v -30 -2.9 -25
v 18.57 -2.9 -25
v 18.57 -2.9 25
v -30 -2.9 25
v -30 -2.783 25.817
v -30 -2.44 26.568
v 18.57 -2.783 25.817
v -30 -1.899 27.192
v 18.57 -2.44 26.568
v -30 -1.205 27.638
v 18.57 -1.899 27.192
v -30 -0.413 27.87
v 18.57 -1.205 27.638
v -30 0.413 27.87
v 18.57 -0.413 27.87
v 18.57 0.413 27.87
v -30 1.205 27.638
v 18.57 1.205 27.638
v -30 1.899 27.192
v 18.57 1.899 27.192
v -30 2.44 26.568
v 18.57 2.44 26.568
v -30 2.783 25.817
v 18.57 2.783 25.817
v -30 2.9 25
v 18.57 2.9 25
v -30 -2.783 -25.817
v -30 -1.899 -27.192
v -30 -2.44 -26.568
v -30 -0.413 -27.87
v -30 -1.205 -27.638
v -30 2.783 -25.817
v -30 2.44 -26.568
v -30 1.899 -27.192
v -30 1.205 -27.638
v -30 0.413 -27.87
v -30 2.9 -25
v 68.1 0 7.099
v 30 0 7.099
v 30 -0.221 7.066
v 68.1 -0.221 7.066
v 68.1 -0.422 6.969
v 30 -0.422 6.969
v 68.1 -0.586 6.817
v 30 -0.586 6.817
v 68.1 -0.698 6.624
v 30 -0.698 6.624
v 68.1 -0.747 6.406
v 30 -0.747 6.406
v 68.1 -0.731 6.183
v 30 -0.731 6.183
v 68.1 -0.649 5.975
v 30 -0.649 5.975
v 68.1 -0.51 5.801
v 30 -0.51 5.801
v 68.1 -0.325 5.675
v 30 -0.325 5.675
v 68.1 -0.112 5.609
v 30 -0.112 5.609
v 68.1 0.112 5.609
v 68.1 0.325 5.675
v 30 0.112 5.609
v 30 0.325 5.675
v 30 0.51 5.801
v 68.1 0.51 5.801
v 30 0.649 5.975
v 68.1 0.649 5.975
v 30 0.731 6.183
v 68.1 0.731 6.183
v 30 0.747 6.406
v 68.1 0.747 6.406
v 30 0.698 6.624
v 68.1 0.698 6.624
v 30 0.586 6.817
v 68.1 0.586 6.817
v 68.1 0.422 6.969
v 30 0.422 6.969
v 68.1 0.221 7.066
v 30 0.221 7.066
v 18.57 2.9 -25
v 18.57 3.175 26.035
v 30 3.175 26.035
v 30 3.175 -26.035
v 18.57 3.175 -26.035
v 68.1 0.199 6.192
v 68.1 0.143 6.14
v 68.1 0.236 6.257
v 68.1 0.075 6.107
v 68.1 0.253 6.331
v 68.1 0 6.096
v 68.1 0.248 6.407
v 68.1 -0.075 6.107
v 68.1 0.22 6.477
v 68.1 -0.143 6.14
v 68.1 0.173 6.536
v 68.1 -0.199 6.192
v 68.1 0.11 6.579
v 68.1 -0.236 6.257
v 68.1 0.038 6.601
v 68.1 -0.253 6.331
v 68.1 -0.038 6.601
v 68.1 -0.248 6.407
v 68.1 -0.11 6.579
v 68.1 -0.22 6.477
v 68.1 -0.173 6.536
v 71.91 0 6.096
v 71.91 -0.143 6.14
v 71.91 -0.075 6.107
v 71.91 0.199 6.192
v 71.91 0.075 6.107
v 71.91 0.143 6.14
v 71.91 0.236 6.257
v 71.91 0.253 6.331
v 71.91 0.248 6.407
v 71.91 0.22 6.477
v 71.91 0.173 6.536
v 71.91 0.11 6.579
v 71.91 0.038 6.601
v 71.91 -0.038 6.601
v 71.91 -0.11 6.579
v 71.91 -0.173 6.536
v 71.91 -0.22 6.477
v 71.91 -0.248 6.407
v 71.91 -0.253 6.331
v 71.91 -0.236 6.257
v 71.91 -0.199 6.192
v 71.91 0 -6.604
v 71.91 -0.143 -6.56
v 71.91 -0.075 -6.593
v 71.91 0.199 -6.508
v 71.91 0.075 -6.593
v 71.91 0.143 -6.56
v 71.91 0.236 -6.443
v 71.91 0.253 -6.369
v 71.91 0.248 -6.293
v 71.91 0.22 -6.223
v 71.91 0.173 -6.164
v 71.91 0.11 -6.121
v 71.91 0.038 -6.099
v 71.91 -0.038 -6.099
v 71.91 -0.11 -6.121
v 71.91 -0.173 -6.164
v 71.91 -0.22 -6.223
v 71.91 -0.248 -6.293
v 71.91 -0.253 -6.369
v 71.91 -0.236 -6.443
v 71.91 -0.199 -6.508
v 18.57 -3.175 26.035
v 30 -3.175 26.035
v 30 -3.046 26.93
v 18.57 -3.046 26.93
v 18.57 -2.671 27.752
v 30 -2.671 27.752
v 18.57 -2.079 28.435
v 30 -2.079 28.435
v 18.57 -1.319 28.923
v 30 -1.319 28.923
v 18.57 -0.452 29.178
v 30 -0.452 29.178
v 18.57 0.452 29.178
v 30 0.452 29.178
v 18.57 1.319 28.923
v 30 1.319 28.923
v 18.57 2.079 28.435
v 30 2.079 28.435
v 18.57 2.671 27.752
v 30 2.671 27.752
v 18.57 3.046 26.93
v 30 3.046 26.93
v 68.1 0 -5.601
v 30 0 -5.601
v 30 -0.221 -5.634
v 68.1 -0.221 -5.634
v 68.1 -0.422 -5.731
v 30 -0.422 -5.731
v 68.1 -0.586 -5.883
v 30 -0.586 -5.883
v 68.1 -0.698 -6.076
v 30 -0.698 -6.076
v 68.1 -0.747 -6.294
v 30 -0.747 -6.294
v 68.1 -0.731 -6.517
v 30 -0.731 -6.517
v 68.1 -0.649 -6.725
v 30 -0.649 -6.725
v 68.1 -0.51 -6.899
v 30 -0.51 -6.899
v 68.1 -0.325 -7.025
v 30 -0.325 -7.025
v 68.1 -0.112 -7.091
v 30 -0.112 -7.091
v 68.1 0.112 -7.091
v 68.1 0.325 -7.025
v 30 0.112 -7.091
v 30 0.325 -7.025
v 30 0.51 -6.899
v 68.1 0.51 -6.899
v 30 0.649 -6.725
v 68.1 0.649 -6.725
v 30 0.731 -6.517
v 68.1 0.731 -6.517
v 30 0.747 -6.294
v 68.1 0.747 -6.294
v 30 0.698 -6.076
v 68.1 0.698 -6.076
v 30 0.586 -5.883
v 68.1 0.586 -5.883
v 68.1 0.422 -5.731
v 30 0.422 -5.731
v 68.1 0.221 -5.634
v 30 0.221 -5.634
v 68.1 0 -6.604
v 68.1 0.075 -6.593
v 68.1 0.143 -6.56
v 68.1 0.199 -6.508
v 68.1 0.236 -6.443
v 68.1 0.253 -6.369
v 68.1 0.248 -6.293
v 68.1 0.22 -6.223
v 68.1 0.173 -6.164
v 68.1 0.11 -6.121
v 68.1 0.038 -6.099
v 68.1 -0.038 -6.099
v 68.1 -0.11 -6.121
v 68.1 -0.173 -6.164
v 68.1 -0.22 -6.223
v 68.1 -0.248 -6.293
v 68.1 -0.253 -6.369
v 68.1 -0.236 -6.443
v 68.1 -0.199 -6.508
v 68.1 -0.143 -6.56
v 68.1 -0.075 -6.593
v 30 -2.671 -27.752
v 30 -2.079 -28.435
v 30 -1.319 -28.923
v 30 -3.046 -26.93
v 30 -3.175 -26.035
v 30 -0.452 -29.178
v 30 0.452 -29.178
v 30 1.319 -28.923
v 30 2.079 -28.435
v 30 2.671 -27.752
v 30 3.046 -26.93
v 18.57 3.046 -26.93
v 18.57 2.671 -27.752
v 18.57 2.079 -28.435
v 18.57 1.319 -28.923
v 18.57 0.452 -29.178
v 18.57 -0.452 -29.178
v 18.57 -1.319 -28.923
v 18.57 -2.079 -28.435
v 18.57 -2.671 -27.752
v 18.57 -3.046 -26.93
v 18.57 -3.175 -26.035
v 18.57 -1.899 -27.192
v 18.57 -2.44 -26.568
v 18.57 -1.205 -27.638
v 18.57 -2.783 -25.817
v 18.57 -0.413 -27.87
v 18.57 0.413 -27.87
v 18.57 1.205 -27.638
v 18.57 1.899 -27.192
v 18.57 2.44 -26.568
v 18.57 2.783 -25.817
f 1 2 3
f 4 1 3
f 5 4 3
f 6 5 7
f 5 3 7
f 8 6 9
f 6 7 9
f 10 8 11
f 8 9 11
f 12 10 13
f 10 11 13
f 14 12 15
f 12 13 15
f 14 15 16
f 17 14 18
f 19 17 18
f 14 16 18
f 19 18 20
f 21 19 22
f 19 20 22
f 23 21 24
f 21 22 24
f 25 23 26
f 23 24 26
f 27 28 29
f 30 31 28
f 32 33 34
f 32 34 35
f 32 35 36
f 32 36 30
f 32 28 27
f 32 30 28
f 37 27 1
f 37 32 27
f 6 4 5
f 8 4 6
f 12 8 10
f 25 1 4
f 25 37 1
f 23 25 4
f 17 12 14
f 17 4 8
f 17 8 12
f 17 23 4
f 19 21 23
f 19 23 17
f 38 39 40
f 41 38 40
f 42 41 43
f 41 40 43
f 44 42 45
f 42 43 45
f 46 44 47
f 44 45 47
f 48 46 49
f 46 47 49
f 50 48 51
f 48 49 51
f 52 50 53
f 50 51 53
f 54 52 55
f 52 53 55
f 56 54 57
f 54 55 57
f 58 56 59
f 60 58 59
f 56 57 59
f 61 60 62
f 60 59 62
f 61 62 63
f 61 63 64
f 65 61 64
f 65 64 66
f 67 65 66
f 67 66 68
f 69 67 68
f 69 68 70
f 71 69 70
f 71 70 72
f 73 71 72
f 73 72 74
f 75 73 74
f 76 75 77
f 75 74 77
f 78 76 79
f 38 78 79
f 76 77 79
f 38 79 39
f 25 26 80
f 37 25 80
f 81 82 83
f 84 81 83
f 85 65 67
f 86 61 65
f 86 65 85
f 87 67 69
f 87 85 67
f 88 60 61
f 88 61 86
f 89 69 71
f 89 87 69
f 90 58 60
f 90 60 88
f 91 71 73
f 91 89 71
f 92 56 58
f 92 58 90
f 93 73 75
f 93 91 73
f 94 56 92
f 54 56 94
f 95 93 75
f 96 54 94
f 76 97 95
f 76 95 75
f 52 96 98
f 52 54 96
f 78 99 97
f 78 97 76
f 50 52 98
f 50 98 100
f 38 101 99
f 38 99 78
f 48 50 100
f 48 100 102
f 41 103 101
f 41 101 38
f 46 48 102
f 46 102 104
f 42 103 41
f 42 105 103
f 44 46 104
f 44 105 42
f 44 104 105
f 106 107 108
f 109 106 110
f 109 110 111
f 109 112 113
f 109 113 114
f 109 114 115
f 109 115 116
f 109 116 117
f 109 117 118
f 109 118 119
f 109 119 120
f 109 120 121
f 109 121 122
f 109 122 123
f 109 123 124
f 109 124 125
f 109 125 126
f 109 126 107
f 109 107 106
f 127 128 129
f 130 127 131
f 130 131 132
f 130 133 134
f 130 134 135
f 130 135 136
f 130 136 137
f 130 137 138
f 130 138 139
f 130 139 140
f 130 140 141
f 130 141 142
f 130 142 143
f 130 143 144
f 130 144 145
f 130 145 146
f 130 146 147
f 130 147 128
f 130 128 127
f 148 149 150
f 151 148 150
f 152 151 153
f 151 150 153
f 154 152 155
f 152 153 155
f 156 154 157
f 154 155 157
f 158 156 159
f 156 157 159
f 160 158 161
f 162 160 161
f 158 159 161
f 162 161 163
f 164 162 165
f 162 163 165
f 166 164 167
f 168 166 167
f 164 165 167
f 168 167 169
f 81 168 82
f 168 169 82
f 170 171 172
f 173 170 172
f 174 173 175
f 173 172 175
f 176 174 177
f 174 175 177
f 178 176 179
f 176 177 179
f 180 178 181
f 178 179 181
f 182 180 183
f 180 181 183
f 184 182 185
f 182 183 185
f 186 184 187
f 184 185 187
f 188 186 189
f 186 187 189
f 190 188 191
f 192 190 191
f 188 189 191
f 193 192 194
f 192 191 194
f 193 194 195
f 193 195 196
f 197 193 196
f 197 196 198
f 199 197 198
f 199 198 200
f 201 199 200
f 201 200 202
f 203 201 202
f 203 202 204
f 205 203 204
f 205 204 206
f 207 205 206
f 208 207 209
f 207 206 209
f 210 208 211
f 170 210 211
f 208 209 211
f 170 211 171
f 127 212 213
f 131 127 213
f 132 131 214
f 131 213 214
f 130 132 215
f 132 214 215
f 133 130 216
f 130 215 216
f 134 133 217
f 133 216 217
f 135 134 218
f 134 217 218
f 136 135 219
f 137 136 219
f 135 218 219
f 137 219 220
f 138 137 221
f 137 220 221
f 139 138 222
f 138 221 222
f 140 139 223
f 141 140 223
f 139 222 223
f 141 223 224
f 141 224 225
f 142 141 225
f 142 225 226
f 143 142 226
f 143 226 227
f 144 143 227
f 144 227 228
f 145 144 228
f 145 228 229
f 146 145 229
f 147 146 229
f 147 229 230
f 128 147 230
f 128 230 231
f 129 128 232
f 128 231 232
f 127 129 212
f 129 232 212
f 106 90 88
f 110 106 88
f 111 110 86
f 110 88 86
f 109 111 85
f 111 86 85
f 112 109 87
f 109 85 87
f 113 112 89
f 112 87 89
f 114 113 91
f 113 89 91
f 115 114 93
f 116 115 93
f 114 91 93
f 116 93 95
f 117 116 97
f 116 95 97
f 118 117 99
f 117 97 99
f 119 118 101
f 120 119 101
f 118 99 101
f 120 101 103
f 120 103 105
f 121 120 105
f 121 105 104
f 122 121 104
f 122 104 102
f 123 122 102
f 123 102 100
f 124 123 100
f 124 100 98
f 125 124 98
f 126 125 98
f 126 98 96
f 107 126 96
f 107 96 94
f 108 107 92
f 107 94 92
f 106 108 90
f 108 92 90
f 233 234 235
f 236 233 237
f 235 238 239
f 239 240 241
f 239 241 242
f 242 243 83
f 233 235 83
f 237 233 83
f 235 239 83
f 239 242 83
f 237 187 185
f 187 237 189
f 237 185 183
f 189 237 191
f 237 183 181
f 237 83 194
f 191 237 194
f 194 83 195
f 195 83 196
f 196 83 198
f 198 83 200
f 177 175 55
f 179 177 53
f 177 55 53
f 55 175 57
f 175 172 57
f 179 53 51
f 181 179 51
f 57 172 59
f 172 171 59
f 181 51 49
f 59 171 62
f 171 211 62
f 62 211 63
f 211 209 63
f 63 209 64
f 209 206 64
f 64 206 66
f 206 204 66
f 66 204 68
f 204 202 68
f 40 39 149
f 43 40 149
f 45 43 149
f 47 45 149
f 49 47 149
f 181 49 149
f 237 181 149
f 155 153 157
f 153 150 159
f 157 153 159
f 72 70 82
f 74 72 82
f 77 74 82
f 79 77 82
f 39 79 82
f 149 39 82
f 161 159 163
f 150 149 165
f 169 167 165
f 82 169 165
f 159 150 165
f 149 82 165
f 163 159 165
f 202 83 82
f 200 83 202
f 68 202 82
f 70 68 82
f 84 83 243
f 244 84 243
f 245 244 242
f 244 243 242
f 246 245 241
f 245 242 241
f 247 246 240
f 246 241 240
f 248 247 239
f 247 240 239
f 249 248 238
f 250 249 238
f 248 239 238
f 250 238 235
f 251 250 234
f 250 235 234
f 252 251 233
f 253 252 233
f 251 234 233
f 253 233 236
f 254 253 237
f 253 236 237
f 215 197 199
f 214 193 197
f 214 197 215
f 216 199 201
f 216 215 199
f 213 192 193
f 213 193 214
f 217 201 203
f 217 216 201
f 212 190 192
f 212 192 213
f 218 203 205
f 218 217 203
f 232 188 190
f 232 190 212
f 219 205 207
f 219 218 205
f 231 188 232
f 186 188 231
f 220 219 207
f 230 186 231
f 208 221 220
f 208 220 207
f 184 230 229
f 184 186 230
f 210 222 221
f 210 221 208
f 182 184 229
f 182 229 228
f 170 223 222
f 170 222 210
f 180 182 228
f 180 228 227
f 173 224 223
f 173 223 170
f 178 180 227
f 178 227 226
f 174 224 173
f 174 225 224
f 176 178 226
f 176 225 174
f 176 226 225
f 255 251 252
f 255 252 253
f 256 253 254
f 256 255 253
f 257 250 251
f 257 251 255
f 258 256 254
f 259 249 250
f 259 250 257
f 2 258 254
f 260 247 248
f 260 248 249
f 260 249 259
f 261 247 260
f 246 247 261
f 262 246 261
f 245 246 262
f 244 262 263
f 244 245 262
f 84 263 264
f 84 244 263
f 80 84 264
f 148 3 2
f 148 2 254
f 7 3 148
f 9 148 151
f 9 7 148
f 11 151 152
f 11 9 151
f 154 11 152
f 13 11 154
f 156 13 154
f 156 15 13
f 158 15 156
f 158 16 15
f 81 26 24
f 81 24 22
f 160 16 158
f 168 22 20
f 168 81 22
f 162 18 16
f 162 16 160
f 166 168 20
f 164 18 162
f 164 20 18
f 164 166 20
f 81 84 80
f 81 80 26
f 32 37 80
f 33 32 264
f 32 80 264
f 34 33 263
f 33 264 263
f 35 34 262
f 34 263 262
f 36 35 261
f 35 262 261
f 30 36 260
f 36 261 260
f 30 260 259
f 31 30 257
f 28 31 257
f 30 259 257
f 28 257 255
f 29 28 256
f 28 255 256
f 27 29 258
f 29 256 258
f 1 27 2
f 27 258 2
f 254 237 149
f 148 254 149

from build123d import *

# Parameters (mm, degrees)
BOSS_EXTRUDE1_DEPTH = 30
SKETCH2_R           = 0.7493
BOSS_EXTRUDE2_DEPTH = 38.1
SKETCH3_R           = 0.254
BOSS_EXTRUDE3_DEPTH = 3.81
SKETCH5_R           = 0.254
BOSS_EXTRUDE4_DEPTH = 3.81
BOSS_EXTRUDE6_DEPTH = 11.43


with BuildPart() as part:
    # Sketch1 → Boss-Extrude1 (new, symmetric)
    with BuildSketch(Plane(origin=(0, 0, 0), x_dir=(0, 0, -1), z_dir=(1, 0, 0))):
        with BuildLine():
            Line((-25, 2.9), (25, 2.9))
            ThreePointArc((25, 2.9), (27.9, 0), (25, -2.9))
            Line((25, -2.9), (-25, -2.9))
            ThreePointArc((-25, -2.9), (-27.9, 0), (-25, 2.9))
        make_face()
    extrude(amount=BOSS_EXTRUDE1_DEPTH, both=True)

    # Sketch2 → Boss-Extrude2 (add)
    with BuildSketch(Plane(origin=(30, 0, 0), x_dir=(0, 0, -1), z_dir=(1, 0, 0))):
        with Locations(Location((-6.35, 0, 0), (0, 0, 180))):
            Circle(SKETCH2_R)
        with Locations(Location((6.35, 0, 0), (0, 0, 180))):
            Circle(SKETCH2_R)
    extrude(amount=BOSS_EXTRUDE2_DEPTH)

    # Sketch3 → Boss-Extrude3 (add)
    with BuildSketch(Plane(origin=(68.1, 0, 0), x_dir=(0, 0, -1), z_dir=(1, 0, 0))):
        with Locations((-6.35, 0)):
            Circle(SKETCH3_R)
    extrude(amount=BOSS_EXTRUDE3_DEPTH)

    # Sketch5 → Boss-Extrude4 (add)
    with BuildSketch(Plane(origin=(68.1, 0, 0), x_dir=(0, 0, -1), z_dir=(1, 0, 0))):
        with Locations((6.35, 0)):
            Circle(SKETCH5_R)
    extrude(amount=BOSS_EXTRUDE4_DEPTH)

    # Sketch6 → Boss-Extrude6 (add)
    with BuildSketch(Plane(origin=(30, 0, 0), x_dir=(0, 0, -1), z_dir=(1, 0, 0))):
        with BuildLine():
            Line((26.035, -3.175), (-26.035, -3.175))
            ThreePointArc((-26.035, -3.175), (-29.21, 0), (-26.035, 3.175))
            Line((-26.035, 3.175), (26.035, 3.175))
            ThreePointArc((26.035, 3.175), (29.21, 0), (26.035, -3.175))
        make_face()
    extrude(amount=-BOSS_EXTRUDE6_DEPTH)


solid = part.part
